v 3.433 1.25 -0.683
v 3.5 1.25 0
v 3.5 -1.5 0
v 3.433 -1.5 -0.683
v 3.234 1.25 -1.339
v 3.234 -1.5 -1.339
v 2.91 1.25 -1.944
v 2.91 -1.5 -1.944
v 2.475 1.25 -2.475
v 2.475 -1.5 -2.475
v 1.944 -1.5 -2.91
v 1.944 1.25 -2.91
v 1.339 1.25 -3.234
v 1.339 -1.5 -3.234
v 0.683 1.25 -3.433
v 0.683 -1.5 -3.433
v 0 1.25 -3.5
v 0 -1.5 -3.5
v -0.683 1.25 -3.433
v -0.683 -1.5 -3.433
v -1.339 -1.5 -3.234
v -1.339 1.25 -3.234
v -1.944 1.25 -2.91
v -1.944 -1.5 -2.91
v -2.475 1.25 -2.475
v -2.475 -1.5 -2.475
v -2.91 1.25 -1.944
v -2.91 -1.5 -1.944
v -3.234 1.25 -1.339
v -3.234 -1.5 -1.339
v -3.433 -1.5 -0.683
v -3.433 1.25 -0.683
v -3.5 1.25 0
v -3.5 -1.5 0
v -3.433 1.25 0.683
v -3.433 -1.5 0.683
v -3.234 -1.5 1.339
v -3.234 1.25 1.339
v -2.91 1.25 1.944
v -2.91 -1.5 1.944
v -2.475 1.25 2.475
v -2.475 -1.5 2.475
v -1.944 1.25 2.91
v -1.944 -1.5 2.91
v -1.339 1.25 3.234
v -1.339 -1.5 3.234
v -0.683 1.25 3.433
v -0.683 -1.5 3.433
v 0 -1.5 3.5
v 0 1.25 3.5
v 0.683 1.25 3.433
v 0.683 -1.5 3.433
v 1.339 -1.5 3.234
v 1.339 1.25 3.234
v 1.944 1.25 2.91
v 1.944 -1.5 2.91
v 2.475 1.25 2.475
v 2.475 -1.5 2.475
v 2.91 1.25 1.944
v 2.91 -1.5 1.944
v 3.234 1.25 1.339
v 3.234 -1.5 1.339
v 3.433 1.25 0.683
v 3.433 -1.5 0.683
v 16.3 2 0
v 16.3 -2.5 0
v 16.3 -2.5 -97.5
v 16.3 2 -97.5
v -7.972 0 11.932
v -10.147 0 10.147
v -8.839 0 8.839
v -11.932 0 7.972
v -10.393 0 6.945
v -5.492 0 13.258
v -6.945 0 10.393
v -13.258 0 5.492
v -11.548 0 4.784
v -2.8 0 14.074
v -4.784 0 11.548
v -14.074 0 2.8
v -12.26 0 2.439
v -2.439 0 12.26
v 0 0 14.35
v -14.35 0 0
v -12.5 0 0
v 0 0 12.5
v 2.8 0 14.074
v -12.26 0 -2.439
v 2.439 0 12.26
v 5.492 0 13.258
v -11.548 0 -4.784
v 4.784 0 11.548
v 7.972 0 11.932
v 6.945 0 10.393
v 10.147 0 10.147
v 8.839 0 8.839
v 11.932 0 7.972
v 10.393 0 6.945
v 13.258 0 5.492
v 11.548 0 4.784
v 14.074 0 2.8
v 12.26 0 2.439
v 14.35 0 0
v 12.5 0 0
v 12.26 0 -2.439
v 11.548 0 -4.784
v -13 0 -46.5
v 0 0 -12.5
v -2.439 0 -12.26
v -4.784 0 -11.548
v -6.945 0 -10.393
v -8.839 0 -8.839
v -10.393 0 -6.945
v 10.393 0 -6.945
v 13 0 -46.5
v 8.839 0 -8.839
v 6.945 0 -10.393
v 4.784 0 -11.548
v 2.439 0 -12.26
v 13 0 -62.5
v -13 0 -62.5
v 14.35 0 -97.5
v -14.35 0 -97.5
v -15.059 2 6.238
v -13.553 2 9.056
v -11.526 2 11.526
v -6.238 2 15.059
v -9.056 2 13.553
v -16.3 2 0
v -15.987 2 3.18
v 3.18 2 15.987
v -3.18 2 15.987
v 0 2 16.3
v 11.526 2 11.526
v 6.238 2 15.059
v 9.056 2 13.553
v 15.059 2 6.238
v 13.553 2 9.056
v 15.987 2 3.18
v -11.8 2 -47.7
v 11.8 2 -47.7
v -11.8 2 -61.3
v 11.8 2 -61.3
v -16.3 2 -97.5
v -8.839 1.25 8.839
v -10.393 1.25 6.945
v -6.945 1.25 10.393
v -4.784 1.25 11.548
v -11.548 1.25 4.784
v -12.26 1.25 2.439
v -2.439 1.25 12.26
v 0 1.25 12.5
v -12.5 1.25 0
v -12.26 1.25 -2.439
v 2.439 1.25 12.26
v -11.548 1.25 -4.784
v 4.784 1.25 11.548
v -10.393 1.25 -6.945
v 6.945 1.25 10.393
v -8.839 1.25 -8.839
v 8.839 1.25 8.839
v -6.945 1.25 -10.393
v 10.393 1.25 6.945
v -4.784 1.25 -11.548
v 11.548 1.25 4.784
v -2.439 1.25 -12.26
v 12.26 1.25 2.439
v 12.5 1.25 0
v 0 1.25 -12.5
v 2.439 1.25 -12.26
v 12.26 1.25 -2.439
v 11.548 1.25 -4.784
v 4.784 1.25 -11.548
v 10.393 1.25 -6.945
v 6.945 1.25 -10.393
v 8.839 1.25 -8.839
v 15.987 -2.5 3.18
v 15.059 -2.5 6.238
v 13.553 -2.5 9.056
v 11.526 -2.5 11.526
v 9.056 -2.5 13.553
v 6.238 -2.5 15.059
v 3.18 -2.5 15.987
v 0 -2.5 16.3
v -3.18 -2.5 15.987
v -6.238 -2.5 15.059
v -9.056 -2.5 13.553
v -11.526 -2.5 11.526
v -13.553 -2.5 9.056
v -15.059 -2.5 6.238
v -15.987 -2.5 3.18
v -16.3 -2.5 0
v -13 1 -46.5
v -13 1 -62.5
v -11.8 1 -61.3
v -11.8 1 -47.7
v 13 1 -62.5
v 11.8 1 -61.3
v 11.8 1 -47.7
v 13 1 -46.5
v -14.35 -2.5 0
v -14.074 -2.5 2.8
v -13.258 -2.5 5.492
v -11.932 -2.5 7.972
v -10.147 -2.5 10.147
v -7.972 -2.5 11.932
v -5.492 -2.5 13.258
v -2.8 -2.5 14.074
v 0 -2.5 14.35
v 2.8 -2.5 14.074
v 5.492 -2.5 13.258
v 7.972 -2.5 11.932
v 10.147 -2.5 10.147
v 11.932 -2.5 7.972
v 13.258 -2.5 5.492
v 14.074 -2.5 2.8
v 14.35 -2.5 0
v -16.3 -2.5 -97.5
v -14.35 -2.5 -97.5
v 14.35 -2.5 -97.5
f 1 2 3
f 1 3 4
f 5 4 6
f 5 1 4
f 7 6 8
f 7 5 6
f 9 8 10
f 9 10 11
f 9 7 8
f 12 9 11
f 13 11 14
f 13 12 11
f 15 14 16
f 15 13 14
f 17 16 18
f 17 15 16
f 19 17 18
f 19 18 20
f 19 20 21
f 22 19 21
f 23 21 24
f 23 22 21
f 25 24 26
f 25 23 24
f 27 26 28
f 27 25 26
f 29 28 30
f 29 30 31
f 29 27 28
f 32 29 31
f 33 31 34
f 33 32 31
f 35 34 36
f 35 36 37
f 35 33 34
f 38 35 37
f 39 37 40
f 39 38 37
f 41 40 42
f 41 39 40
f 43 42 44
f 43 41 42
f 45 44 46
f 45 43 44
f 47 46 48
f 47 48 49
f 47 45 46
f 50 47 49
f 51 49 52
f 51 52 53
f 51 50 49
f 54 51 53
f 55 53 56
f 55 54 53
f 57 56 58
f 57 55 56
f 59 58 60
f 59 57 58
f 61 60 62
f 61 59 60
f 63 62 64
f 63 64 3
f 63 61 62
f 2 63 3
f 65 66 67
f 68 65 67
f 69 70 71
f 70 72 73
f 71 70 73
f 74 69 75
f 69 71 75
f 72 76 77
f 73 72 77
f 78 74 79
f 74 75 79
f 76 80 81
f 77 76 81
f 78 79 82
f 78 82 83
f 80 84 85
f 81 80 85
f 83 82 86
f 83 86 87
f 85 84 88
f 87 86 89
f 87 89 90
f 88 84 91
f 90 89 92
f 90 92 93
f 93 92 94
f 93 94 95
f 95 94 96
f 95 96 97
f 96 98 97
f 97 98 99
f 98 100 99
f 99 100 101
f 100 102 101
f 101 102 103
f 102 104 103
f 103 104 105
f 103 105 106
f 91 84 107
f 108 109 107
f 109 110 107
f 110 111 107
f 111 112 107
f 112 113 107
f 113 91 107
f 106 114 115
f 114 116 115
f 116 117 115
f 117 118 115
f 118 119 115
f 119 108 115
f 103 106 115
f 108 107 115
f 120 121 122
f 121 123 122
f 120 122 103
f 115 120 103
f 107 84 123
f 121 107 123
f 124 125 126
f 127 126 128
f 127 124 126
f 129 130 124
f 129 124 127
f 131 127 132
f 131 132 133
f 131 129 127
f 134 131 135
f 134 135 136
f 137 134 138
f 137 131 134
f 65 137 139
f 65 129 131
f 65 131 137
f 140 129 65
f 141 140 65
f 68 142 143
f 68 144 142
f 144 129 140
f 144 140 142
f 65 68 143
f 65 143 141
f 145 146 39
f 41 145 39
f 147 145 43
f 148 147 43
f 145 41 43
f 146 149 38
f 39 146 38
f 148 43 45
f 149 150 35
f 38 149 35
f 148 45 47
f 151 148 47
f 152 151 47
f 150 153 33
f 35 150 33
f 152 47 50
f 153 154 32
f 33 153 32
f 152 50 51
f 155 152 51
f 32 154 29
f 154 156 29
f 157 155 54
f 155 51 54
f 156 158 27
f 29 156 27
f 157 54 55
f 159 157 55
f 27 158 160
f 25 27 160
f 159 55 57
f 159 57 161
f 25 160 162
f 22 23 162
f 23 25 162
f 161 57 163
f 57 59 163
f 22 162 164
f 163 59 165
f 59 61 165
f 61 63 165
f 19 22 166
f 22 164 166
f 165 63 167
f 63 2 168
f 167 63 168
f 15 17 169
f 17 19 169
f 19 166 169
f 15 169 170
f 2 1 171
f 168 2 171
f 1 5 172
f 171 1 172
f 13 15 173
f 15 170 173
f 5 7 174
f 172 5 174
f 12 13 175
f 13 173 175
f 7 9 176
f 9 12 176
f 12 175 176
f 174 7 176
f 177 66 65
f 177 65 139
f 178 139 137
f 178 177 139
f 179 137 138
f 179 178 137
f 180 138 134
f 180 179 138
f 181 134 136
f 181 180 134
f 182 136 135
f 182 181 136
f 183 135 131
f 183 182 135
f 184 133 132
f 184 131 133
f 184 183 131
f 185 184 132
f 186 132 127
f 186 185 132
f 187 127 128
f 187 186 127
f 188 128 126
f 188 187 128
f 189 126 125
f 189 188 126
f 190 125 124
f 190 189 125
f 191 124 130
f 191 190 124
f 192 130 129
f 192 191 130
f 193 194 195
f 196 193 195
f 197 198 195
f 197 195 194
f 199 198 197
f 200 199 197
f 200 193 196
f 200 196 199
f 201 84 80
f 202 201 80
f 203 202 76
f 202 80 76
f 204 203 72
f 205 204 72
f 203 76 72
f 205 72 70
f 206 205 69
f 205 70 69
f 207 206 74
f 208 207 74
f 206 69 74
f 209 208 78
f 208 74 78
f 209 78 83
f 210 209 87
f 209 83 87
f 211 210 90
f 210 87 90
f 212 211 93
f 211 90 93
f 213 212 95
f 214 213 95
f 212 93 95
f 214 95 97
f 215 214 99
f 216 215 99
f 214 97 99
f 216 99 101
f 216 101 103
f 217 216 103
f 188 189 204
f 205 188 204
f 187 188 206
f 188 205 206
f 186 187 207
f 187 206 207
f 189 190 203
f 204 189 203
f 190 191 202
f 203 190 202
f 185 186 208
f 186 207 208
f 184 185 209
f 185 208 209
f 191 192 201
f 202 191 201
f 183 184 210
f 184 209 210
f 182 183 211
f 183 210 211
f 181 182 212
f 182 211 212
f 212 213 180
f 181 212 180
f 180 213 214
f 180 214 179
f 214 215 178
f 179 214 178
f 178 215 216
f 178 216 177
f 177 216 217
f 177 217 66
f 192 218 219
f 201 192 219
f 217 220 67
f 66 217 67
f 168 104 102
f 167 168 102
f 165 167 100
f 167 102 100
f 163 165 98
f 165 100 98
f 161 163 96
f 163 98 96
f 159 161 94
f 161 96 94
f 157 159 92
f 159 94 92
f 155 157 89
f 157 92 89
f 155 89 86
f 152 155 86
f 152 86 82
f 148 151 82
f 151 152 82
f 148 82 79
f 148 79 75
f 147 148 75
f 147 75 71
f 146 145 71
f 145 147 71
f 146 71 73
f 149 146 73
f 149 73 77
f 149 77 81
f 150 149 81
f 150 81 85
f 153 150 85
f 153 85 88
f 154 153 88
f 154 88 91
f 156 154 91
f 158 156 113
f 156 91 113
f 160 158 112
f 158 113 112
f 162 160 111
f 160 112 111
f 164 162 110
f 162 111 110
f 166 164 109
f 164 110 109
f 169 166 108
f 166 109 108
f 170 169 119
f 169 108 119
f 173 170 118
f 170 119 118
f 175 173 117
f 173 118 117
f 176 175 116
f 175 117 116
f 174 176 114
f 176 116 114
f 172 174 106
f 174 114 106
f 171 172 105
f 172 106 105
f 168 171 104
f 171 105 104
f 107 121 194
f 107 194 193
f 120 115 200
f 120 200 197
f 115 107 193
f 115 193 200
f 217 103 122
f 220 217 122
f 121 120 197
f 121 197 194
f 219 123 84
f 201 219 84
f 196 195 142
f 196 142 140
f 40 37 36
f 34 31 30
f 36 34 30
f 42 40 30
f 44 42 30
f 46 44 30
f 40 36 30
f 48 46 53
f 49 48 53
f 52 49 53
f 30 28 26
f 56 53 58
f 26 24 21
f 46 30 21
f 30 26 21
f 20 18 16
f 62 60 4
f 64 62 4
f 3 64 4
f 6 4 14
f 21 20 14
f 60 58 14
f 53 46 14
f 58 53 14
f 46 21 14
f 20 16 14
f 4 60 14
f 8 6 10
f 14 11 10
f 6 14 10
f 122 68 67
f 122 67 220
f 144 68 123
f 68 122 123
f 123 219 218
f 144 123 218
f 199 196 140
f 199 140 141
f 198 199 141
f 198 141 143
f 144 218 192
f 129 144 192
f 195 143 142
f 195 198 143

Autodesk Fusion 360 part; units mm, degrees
sketch "Sketch1" plane through (0, 0, 0) normal (0, 1, 0) x (1, 0, 0)
  line L0 (-16.3, 0) -> (16.3, 0)
  line L1 (16.3, 0) -> (16.3, 97.5)
  line L2 (16.3, 97.5) -> (-16.3, 97.5)
  line L3 (-16.3, 97.5) -> (-16.3, 0)
  line L4 (0, 102.6744) -> (0, -20) construction
  arc A0 (-16.3, 0) -> (16.3, 0) centre (0, 0) ccw
  line L5 (-14.35, 97.5) -> (-14.35, 0)
  arc A1 (-14.35, 0) -> (14.35, 0) centre (0, 0) ccw
  line L6 (14.35, 0) -> (14.35, 97.5)
  dimension "d1" = 32.6
  dimension "d2" = 97.5
  dimension "d3" = 1.95
extrude "Extrude1" add sketch "Sketch1" along normal blind 2
extrude "Extrude2" add sketch "Sketch1" against normal blind 2.5 contours L0 L2 L3 L5 | L0 A0 A1 | L0 L1 L2 L6
sketch "Sketch2" plane through (0, 0, 7.15) normal (0, 1, 0) x (1, 0, 0)
  circle A0 centre (0, 7.15) radius 3.5
  circle A1 centre (0, 7.15) radius 4.1
  circle A2 centre (0, 7.15) radius 4.7
  circle A3 centre (0, 7.15) radius 5.3
  circle A4 centre (0, 7.15) radius 5.9
  circle A5 centre (0, 7.15) radius 6.5
  circle A6 centre (0, 7.15) radius 7.1
  circle A7 centre (0, 7.15) radius 7.7
  circle A8 centre (0, 7.15) radius 8.3
  line L0 (27.1083, -9.4638) -> (28.3083, -9.4638)
  line L1 (28.3083, -9.4638) -> (28.3083, -7.488)
  line L2 (28.3083, -7.488) -> (27.1083, -7.488)
  line L3 (27.1083, -7.488) -> (27.1083, -9.4638)
  circle A9 centre (0, 7.15) radius 8.9
  circle A10 centre (0, 7.15) radius 9.5
  circle A11 centre (0, 7.15) radius 10.1
  circle A12 centre (0, 7.15) radius 10.7
  circle A13 centre (0, 7.15) radius 11.3
  circle A14 centre (0, 7.15) radius 11.9
  circle A15 centre (0, 7.15) radius 12.5
  dimension "d18" = 7
  dimension "d19" = 8.2
  dimension "d20" = 1.2
  dimension "d21" = 9.4
  dimension "d22" = 10.6
  dimension "d23" = 11.8
  dimension "d24" = 13
  dimension "d25" = 14.2
  dimension "d26" = 15.4
  dimension "d27" = 16.6
  dimension "d28" = 17.8
  dimension "d29" = 19
  dimension "d30" = 20.2
  dimension "d31" = 21.4
  dimension "d32" = 22.6
  dimension "d33" = 23.8
  dimension "d34" = 25
extrude "Extrude4" cut sketch "Sketch2" along normal blind 1.25 contours A1 | A2 | A3 | A4 | A5 | A6 | A7 | A8 | A9 | A10 | A11 | A12 | A13 | A14 | A15
extrude "Extrude5" add 1 faces at (0.555, 0, 0.9381) along direction (0, -1, 0) blind 1.5
sketch "Sketch3" plane through (0, 0, 0) normal (0, -1, 0) x (1, 0, 0)
  line L0 (14.35, -97.5) -> (14.35, 0)
  arc A0 (14.35, 0) -> (-14.35, 0) centre (0, 0) ccw
  line L1 (-14.35, 0) -> (-14.35, -97.5)
  line L2 (-14.35, -97.5) -> (14.35, -97.5)
  circle A1 centre (0, 0) radius 12.5
  line L3 (13, -62.5) -> (-13, -62.5)
  line L4 (-13, -62.5) -> (-13, -46.5)
  line L5 (-13, -46.5) -> (13, -46.5)
  line L6 (13, -46.5) -> (13, -62.5)
  line L7 (13, -62.5) -> (-13, -46.5) construction
  line L8 (-13, -62.5) -> (13, -46.5) construction
  dimension "d39" = 26
  dimension "d40" = 16
  dimension "d41" = 35
extrude "Extrude6" cut sketch "Sketch3" against normal blind 1 contours L3 L4 L5 L6
sketch "Sketch4" plane through (0, 1, 0) normal (0, -1, 0) x (1, 0, 0)
  line L0 (13, -46.5) -> (-13, -46.5)
  line L1 (-13, -46.5) -> (-13, -62.5)
  line L2 (-13, -62.5) -> (13, -62.5)
  line L3 (13, -62.5) -> (13, -46.5)
  line L4 (11.8, -61.3) -> (-11.8, -61.3)
  line L5 (-11.8, -61.3) -> (-11.8, -47.7)
  line L6 (-11.8, -47.7) -> (11.8, -47.7)
  line L7 (11.8, -47.7) -> (11.8, -61.3)
  line L8 (11.8, -61.3) -> (-11.8, -47.7) construction
  line L9 (-11.8, -61.3) -> (11.8, -47.7) construction
  dimension "d44" = 23.6
  dimension "d45" = 13.6
extrude "Extrude7" cut sketch "Sketch4" against normal blind 1 contours L4 L5 L6 L7
equation "d1 = 33 mm - 0.4 mm"
equation "d2 = 114 mm - ( 33 / 2 ) * 1 mm"
equation "d19 = d18 + d20"
equation "d21 = d19 + d20"
equation "d22 = d21 + d20"
equation "d23 = d22 + d20"
equation "d24 = d23 + d20"
equation "d25 = d24 + d20"
equation "d26 = d25 + d20"
equation "d27 = d26 + d20"
equation "d28 = d27 + d20"
equation "d29 = d28 + d20"
equation "d30 = d29 + d20"
equation "d31 = d30 + d20"
equation "d32 = d31 + d20"
equation "d33 = d32 + d20"
equation "d34 = d33 + d20"
